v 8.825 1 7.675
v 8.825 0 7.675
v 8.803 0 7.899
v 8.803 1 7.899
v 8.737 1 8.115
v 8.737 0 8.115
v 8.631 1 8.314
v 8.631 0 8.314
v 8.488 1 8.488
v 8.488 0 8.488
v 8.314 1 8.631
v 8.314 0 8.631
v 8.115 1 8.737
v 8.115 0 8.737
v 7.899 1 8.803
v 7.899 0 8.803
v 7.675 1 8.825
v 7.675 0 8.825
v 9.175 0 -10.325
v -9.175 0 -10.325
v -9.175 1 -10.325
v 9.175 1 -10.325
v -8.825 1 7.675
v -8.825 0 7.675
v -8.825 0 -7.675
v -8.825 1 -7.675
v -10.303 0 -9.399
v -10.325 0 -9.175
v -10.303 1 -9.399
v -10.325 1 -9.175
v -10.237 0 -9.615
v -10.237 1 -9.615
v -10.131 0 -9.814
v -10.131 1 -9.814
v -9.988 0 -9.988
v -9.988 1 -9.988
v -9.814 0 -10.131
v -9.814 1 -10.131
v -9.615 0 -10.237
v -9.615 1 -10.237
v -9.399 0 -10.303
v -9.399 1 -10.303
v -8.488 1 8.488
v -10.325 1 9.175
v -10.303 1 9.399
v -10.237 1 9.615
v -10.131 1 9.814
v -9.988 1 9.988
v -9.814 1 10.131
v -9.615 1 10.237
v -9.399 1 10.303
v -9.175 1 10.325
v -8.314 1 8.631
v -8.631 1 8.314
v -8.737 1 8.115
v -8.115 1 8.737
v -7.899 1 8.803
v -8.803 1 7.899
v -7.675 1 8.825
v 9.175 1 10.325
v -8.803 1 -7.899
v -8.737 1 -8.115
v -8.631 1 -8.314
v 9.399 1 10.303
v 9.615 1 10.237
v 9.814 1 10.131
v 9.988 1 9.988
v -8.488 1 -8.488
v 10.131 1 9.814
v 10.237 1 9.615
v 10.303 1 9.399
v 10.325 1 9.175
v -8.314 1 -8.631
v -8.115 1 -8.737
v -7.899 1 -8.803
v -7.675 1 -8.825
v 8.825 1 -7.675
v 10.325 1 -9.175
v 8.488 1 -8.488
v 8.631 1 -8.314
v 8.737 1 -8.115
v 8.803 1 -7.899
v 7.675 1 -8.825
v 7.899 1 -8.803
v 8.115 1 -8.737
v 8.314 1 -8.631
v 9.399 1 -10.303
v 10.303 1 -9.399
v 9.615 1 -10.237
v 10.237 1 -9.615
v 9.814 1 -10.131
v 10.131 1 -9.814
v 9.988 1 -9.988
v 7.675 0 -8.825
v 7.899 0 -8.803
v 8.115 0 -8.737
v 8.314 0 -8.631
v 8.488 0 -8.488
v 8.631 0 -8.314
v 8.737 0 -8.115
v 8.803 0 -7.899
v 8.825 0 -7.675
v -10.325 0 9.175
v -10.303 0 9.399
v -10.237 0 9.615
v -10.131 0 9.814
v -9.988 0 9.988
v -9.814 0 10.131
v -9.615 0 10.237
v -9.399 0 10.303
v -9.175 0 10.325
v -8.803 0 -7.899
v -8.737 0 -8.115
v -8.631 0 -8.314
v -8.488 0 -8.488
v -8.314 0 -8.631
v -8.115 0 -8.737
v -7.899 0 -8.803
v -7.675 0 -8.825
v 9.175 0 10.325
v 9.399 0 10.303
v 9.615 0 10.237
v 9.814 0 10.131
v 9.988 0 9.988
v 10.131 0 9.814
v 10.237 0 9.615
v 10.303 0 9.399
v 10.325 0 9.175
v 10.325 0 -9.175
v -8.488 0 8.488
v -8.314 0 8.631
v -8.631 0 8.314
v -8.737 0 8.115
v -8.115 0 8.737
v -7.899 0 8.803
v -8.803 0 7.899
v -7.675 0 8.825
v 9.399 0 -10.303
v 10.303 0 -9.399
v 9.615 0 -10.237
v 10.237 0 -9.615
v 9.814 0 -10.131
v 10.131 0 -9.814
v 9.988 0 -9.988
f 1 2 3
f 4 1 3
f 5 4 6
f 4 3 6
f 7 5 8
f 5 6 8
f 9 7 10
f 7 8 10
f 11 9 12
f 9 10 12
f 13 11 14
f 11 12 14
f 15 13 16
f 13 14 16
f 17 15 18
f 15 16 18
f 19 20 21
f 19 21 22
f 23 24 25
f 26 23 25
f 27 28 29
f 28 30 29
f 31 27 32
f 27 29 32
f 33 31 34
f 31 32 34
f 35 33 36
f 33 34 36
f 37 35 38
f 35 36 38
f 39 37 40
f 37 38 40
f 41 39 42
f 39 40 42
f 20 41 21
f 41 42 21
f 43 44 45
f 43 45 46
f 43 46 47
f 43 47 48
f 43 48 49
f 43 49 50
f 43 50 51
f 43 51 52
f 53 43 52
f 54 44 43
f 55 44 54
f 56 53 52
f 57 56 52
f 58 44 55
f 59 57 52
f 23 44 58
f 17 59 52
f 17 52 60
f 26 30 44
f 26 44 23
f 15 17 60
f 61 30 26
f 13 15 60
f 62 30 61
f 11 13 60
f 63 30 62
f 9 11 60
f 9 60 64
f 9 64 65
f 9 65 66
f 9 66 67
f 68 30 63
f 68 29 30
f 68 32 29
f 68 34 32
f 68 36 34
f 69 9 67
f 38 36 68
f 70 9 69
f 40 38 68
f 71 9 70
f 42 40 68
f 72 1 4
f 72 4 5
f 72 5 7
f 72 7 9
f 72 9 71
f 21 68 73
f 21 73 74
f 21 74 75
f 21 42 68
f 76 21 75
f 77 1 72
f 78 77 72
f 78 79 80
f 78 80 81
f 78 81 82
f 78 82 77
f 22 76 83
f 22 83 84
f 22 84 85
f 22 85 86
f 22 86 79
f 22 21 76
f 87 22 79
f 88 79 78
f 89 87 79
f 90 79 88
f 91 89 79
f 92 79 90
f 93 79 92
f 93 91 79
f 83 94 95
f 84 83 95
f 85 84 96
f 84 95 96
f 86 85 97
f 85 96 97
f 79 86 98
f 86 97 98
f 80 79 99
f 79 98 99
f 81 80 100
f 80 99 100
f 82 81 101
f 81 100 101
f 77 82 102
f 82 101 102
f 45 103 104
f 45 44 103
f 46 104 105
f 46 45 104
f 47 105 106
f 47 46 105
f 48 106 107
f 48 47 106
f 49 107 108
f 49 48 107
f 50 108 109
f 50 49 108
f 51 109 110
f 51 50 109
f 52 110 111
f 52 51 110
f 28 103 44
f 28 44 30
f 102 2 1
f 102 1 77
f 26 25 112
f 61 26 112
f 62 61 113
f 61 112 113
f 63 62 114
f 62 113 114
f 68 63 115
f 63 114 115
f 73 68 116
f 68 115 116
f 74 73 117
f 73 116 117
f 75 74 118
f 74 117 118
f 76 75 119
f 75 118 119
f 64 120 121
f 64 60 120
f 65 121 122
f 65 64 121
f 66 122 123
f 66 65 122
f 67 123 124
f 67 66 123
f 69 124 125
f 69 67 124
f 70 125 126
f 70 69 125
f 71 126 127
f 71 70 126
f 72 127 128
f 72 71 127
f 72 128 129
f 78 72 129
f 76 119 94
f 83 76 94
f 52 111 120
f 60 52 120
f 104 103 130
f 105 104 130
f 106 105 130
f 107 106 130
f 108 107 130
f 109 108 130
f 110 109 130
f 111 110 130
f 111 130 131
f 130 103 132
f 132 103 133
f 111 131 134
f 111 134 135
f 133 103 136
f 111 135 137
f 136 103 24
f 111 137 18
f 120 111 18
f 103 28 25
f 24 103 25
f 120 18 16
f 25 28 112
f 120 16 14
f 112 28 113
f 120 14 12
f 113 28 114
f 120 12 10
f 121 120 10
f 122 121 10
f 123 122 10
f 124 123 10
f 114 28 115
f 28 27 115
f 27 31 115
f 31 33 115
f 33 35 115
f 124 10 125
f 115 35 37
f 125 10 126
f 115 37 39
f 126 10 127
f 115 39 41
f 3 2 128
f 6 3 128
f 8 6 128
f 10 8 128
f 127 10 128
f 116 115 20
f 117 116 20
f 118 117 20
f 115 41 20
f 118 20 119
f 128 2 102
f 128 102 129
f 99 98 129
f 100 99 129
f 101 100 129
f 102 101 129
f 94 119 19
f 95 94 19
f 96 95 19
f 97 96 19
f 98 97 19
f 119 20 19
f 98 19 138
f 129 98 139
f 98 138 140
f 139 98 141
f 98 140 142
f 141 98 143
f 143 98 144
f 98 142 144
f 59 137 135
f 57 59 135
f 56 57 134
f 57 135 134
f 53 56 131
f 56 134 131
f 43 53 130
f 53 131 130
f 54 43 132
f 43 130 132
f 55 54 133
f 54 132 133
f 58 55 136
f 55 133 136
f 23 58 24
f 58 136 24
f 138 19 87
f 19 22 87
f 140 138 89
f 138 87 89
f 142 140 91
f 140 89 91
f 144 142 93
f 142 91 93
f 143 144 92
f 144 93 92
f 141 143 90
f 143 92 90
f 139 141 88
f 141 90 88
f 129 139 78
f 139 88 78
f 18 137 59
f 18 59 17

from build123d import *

# Parameters (mm, degrees)
SKETCH1_W           = 20.65
SKETCH1_H           = 20.65
BOSS_EXTRUDE1_DEPTH = 1
FILLET1_R           = 1.15


with BuildPart() as part:
    # Sketch1 → Boss-Extrude1 (new body)
    with BuildSketch(Plane(origin=(0, 0, 0), x_dir=(1, 0, 0), z_dir=(0, 1, 0))):
        Rectangle(SKETCH1_W, SKETCH1_H)
        with BuildLine():
            Line((7.675, -8.825), (-7.675, -8.825))
            ThreePointArc((-7.675, -8.825), (-8.488172798, -8.488172798), (-8.825, -7.675))
            Line((-8.825, -7.675), (-8.825, 7.675))
            ThreePointArc((-8.825, 7.675), (-8.488172798, 8.488172798), (-7.675, 8.825))
            Line((-7.675, 8.825), (7.675, 8.825))
            ThreePointArc((7.675, 8.825), (8.488172798, 8.488172798), (8.825, 7.675))
            Line((8.825, 7.675), (8.825, -7.675))
            ThreePointArc((8.825, -7.675), (8.488172798, -8.488172798), (7.675, -8.825))
        make_face(mode=Mode.SUBTRACT)
    extrude(amount=BOSS_EXTRUDE1_DEPTH)

    # Fillet1
    fillet1_edges = [part.edges().sort_by_distance(p)[0] for p in [
        (-10.325, 0.5, -10.325),
        (-10.325, 0.5, 10.325),
        (10.325, 0.5, 10.325),
        (10.325, 0.5, -10.325),
    ]]
    fillet(fillet1_edges, radius=FILLET1_R)


solid = part.part
